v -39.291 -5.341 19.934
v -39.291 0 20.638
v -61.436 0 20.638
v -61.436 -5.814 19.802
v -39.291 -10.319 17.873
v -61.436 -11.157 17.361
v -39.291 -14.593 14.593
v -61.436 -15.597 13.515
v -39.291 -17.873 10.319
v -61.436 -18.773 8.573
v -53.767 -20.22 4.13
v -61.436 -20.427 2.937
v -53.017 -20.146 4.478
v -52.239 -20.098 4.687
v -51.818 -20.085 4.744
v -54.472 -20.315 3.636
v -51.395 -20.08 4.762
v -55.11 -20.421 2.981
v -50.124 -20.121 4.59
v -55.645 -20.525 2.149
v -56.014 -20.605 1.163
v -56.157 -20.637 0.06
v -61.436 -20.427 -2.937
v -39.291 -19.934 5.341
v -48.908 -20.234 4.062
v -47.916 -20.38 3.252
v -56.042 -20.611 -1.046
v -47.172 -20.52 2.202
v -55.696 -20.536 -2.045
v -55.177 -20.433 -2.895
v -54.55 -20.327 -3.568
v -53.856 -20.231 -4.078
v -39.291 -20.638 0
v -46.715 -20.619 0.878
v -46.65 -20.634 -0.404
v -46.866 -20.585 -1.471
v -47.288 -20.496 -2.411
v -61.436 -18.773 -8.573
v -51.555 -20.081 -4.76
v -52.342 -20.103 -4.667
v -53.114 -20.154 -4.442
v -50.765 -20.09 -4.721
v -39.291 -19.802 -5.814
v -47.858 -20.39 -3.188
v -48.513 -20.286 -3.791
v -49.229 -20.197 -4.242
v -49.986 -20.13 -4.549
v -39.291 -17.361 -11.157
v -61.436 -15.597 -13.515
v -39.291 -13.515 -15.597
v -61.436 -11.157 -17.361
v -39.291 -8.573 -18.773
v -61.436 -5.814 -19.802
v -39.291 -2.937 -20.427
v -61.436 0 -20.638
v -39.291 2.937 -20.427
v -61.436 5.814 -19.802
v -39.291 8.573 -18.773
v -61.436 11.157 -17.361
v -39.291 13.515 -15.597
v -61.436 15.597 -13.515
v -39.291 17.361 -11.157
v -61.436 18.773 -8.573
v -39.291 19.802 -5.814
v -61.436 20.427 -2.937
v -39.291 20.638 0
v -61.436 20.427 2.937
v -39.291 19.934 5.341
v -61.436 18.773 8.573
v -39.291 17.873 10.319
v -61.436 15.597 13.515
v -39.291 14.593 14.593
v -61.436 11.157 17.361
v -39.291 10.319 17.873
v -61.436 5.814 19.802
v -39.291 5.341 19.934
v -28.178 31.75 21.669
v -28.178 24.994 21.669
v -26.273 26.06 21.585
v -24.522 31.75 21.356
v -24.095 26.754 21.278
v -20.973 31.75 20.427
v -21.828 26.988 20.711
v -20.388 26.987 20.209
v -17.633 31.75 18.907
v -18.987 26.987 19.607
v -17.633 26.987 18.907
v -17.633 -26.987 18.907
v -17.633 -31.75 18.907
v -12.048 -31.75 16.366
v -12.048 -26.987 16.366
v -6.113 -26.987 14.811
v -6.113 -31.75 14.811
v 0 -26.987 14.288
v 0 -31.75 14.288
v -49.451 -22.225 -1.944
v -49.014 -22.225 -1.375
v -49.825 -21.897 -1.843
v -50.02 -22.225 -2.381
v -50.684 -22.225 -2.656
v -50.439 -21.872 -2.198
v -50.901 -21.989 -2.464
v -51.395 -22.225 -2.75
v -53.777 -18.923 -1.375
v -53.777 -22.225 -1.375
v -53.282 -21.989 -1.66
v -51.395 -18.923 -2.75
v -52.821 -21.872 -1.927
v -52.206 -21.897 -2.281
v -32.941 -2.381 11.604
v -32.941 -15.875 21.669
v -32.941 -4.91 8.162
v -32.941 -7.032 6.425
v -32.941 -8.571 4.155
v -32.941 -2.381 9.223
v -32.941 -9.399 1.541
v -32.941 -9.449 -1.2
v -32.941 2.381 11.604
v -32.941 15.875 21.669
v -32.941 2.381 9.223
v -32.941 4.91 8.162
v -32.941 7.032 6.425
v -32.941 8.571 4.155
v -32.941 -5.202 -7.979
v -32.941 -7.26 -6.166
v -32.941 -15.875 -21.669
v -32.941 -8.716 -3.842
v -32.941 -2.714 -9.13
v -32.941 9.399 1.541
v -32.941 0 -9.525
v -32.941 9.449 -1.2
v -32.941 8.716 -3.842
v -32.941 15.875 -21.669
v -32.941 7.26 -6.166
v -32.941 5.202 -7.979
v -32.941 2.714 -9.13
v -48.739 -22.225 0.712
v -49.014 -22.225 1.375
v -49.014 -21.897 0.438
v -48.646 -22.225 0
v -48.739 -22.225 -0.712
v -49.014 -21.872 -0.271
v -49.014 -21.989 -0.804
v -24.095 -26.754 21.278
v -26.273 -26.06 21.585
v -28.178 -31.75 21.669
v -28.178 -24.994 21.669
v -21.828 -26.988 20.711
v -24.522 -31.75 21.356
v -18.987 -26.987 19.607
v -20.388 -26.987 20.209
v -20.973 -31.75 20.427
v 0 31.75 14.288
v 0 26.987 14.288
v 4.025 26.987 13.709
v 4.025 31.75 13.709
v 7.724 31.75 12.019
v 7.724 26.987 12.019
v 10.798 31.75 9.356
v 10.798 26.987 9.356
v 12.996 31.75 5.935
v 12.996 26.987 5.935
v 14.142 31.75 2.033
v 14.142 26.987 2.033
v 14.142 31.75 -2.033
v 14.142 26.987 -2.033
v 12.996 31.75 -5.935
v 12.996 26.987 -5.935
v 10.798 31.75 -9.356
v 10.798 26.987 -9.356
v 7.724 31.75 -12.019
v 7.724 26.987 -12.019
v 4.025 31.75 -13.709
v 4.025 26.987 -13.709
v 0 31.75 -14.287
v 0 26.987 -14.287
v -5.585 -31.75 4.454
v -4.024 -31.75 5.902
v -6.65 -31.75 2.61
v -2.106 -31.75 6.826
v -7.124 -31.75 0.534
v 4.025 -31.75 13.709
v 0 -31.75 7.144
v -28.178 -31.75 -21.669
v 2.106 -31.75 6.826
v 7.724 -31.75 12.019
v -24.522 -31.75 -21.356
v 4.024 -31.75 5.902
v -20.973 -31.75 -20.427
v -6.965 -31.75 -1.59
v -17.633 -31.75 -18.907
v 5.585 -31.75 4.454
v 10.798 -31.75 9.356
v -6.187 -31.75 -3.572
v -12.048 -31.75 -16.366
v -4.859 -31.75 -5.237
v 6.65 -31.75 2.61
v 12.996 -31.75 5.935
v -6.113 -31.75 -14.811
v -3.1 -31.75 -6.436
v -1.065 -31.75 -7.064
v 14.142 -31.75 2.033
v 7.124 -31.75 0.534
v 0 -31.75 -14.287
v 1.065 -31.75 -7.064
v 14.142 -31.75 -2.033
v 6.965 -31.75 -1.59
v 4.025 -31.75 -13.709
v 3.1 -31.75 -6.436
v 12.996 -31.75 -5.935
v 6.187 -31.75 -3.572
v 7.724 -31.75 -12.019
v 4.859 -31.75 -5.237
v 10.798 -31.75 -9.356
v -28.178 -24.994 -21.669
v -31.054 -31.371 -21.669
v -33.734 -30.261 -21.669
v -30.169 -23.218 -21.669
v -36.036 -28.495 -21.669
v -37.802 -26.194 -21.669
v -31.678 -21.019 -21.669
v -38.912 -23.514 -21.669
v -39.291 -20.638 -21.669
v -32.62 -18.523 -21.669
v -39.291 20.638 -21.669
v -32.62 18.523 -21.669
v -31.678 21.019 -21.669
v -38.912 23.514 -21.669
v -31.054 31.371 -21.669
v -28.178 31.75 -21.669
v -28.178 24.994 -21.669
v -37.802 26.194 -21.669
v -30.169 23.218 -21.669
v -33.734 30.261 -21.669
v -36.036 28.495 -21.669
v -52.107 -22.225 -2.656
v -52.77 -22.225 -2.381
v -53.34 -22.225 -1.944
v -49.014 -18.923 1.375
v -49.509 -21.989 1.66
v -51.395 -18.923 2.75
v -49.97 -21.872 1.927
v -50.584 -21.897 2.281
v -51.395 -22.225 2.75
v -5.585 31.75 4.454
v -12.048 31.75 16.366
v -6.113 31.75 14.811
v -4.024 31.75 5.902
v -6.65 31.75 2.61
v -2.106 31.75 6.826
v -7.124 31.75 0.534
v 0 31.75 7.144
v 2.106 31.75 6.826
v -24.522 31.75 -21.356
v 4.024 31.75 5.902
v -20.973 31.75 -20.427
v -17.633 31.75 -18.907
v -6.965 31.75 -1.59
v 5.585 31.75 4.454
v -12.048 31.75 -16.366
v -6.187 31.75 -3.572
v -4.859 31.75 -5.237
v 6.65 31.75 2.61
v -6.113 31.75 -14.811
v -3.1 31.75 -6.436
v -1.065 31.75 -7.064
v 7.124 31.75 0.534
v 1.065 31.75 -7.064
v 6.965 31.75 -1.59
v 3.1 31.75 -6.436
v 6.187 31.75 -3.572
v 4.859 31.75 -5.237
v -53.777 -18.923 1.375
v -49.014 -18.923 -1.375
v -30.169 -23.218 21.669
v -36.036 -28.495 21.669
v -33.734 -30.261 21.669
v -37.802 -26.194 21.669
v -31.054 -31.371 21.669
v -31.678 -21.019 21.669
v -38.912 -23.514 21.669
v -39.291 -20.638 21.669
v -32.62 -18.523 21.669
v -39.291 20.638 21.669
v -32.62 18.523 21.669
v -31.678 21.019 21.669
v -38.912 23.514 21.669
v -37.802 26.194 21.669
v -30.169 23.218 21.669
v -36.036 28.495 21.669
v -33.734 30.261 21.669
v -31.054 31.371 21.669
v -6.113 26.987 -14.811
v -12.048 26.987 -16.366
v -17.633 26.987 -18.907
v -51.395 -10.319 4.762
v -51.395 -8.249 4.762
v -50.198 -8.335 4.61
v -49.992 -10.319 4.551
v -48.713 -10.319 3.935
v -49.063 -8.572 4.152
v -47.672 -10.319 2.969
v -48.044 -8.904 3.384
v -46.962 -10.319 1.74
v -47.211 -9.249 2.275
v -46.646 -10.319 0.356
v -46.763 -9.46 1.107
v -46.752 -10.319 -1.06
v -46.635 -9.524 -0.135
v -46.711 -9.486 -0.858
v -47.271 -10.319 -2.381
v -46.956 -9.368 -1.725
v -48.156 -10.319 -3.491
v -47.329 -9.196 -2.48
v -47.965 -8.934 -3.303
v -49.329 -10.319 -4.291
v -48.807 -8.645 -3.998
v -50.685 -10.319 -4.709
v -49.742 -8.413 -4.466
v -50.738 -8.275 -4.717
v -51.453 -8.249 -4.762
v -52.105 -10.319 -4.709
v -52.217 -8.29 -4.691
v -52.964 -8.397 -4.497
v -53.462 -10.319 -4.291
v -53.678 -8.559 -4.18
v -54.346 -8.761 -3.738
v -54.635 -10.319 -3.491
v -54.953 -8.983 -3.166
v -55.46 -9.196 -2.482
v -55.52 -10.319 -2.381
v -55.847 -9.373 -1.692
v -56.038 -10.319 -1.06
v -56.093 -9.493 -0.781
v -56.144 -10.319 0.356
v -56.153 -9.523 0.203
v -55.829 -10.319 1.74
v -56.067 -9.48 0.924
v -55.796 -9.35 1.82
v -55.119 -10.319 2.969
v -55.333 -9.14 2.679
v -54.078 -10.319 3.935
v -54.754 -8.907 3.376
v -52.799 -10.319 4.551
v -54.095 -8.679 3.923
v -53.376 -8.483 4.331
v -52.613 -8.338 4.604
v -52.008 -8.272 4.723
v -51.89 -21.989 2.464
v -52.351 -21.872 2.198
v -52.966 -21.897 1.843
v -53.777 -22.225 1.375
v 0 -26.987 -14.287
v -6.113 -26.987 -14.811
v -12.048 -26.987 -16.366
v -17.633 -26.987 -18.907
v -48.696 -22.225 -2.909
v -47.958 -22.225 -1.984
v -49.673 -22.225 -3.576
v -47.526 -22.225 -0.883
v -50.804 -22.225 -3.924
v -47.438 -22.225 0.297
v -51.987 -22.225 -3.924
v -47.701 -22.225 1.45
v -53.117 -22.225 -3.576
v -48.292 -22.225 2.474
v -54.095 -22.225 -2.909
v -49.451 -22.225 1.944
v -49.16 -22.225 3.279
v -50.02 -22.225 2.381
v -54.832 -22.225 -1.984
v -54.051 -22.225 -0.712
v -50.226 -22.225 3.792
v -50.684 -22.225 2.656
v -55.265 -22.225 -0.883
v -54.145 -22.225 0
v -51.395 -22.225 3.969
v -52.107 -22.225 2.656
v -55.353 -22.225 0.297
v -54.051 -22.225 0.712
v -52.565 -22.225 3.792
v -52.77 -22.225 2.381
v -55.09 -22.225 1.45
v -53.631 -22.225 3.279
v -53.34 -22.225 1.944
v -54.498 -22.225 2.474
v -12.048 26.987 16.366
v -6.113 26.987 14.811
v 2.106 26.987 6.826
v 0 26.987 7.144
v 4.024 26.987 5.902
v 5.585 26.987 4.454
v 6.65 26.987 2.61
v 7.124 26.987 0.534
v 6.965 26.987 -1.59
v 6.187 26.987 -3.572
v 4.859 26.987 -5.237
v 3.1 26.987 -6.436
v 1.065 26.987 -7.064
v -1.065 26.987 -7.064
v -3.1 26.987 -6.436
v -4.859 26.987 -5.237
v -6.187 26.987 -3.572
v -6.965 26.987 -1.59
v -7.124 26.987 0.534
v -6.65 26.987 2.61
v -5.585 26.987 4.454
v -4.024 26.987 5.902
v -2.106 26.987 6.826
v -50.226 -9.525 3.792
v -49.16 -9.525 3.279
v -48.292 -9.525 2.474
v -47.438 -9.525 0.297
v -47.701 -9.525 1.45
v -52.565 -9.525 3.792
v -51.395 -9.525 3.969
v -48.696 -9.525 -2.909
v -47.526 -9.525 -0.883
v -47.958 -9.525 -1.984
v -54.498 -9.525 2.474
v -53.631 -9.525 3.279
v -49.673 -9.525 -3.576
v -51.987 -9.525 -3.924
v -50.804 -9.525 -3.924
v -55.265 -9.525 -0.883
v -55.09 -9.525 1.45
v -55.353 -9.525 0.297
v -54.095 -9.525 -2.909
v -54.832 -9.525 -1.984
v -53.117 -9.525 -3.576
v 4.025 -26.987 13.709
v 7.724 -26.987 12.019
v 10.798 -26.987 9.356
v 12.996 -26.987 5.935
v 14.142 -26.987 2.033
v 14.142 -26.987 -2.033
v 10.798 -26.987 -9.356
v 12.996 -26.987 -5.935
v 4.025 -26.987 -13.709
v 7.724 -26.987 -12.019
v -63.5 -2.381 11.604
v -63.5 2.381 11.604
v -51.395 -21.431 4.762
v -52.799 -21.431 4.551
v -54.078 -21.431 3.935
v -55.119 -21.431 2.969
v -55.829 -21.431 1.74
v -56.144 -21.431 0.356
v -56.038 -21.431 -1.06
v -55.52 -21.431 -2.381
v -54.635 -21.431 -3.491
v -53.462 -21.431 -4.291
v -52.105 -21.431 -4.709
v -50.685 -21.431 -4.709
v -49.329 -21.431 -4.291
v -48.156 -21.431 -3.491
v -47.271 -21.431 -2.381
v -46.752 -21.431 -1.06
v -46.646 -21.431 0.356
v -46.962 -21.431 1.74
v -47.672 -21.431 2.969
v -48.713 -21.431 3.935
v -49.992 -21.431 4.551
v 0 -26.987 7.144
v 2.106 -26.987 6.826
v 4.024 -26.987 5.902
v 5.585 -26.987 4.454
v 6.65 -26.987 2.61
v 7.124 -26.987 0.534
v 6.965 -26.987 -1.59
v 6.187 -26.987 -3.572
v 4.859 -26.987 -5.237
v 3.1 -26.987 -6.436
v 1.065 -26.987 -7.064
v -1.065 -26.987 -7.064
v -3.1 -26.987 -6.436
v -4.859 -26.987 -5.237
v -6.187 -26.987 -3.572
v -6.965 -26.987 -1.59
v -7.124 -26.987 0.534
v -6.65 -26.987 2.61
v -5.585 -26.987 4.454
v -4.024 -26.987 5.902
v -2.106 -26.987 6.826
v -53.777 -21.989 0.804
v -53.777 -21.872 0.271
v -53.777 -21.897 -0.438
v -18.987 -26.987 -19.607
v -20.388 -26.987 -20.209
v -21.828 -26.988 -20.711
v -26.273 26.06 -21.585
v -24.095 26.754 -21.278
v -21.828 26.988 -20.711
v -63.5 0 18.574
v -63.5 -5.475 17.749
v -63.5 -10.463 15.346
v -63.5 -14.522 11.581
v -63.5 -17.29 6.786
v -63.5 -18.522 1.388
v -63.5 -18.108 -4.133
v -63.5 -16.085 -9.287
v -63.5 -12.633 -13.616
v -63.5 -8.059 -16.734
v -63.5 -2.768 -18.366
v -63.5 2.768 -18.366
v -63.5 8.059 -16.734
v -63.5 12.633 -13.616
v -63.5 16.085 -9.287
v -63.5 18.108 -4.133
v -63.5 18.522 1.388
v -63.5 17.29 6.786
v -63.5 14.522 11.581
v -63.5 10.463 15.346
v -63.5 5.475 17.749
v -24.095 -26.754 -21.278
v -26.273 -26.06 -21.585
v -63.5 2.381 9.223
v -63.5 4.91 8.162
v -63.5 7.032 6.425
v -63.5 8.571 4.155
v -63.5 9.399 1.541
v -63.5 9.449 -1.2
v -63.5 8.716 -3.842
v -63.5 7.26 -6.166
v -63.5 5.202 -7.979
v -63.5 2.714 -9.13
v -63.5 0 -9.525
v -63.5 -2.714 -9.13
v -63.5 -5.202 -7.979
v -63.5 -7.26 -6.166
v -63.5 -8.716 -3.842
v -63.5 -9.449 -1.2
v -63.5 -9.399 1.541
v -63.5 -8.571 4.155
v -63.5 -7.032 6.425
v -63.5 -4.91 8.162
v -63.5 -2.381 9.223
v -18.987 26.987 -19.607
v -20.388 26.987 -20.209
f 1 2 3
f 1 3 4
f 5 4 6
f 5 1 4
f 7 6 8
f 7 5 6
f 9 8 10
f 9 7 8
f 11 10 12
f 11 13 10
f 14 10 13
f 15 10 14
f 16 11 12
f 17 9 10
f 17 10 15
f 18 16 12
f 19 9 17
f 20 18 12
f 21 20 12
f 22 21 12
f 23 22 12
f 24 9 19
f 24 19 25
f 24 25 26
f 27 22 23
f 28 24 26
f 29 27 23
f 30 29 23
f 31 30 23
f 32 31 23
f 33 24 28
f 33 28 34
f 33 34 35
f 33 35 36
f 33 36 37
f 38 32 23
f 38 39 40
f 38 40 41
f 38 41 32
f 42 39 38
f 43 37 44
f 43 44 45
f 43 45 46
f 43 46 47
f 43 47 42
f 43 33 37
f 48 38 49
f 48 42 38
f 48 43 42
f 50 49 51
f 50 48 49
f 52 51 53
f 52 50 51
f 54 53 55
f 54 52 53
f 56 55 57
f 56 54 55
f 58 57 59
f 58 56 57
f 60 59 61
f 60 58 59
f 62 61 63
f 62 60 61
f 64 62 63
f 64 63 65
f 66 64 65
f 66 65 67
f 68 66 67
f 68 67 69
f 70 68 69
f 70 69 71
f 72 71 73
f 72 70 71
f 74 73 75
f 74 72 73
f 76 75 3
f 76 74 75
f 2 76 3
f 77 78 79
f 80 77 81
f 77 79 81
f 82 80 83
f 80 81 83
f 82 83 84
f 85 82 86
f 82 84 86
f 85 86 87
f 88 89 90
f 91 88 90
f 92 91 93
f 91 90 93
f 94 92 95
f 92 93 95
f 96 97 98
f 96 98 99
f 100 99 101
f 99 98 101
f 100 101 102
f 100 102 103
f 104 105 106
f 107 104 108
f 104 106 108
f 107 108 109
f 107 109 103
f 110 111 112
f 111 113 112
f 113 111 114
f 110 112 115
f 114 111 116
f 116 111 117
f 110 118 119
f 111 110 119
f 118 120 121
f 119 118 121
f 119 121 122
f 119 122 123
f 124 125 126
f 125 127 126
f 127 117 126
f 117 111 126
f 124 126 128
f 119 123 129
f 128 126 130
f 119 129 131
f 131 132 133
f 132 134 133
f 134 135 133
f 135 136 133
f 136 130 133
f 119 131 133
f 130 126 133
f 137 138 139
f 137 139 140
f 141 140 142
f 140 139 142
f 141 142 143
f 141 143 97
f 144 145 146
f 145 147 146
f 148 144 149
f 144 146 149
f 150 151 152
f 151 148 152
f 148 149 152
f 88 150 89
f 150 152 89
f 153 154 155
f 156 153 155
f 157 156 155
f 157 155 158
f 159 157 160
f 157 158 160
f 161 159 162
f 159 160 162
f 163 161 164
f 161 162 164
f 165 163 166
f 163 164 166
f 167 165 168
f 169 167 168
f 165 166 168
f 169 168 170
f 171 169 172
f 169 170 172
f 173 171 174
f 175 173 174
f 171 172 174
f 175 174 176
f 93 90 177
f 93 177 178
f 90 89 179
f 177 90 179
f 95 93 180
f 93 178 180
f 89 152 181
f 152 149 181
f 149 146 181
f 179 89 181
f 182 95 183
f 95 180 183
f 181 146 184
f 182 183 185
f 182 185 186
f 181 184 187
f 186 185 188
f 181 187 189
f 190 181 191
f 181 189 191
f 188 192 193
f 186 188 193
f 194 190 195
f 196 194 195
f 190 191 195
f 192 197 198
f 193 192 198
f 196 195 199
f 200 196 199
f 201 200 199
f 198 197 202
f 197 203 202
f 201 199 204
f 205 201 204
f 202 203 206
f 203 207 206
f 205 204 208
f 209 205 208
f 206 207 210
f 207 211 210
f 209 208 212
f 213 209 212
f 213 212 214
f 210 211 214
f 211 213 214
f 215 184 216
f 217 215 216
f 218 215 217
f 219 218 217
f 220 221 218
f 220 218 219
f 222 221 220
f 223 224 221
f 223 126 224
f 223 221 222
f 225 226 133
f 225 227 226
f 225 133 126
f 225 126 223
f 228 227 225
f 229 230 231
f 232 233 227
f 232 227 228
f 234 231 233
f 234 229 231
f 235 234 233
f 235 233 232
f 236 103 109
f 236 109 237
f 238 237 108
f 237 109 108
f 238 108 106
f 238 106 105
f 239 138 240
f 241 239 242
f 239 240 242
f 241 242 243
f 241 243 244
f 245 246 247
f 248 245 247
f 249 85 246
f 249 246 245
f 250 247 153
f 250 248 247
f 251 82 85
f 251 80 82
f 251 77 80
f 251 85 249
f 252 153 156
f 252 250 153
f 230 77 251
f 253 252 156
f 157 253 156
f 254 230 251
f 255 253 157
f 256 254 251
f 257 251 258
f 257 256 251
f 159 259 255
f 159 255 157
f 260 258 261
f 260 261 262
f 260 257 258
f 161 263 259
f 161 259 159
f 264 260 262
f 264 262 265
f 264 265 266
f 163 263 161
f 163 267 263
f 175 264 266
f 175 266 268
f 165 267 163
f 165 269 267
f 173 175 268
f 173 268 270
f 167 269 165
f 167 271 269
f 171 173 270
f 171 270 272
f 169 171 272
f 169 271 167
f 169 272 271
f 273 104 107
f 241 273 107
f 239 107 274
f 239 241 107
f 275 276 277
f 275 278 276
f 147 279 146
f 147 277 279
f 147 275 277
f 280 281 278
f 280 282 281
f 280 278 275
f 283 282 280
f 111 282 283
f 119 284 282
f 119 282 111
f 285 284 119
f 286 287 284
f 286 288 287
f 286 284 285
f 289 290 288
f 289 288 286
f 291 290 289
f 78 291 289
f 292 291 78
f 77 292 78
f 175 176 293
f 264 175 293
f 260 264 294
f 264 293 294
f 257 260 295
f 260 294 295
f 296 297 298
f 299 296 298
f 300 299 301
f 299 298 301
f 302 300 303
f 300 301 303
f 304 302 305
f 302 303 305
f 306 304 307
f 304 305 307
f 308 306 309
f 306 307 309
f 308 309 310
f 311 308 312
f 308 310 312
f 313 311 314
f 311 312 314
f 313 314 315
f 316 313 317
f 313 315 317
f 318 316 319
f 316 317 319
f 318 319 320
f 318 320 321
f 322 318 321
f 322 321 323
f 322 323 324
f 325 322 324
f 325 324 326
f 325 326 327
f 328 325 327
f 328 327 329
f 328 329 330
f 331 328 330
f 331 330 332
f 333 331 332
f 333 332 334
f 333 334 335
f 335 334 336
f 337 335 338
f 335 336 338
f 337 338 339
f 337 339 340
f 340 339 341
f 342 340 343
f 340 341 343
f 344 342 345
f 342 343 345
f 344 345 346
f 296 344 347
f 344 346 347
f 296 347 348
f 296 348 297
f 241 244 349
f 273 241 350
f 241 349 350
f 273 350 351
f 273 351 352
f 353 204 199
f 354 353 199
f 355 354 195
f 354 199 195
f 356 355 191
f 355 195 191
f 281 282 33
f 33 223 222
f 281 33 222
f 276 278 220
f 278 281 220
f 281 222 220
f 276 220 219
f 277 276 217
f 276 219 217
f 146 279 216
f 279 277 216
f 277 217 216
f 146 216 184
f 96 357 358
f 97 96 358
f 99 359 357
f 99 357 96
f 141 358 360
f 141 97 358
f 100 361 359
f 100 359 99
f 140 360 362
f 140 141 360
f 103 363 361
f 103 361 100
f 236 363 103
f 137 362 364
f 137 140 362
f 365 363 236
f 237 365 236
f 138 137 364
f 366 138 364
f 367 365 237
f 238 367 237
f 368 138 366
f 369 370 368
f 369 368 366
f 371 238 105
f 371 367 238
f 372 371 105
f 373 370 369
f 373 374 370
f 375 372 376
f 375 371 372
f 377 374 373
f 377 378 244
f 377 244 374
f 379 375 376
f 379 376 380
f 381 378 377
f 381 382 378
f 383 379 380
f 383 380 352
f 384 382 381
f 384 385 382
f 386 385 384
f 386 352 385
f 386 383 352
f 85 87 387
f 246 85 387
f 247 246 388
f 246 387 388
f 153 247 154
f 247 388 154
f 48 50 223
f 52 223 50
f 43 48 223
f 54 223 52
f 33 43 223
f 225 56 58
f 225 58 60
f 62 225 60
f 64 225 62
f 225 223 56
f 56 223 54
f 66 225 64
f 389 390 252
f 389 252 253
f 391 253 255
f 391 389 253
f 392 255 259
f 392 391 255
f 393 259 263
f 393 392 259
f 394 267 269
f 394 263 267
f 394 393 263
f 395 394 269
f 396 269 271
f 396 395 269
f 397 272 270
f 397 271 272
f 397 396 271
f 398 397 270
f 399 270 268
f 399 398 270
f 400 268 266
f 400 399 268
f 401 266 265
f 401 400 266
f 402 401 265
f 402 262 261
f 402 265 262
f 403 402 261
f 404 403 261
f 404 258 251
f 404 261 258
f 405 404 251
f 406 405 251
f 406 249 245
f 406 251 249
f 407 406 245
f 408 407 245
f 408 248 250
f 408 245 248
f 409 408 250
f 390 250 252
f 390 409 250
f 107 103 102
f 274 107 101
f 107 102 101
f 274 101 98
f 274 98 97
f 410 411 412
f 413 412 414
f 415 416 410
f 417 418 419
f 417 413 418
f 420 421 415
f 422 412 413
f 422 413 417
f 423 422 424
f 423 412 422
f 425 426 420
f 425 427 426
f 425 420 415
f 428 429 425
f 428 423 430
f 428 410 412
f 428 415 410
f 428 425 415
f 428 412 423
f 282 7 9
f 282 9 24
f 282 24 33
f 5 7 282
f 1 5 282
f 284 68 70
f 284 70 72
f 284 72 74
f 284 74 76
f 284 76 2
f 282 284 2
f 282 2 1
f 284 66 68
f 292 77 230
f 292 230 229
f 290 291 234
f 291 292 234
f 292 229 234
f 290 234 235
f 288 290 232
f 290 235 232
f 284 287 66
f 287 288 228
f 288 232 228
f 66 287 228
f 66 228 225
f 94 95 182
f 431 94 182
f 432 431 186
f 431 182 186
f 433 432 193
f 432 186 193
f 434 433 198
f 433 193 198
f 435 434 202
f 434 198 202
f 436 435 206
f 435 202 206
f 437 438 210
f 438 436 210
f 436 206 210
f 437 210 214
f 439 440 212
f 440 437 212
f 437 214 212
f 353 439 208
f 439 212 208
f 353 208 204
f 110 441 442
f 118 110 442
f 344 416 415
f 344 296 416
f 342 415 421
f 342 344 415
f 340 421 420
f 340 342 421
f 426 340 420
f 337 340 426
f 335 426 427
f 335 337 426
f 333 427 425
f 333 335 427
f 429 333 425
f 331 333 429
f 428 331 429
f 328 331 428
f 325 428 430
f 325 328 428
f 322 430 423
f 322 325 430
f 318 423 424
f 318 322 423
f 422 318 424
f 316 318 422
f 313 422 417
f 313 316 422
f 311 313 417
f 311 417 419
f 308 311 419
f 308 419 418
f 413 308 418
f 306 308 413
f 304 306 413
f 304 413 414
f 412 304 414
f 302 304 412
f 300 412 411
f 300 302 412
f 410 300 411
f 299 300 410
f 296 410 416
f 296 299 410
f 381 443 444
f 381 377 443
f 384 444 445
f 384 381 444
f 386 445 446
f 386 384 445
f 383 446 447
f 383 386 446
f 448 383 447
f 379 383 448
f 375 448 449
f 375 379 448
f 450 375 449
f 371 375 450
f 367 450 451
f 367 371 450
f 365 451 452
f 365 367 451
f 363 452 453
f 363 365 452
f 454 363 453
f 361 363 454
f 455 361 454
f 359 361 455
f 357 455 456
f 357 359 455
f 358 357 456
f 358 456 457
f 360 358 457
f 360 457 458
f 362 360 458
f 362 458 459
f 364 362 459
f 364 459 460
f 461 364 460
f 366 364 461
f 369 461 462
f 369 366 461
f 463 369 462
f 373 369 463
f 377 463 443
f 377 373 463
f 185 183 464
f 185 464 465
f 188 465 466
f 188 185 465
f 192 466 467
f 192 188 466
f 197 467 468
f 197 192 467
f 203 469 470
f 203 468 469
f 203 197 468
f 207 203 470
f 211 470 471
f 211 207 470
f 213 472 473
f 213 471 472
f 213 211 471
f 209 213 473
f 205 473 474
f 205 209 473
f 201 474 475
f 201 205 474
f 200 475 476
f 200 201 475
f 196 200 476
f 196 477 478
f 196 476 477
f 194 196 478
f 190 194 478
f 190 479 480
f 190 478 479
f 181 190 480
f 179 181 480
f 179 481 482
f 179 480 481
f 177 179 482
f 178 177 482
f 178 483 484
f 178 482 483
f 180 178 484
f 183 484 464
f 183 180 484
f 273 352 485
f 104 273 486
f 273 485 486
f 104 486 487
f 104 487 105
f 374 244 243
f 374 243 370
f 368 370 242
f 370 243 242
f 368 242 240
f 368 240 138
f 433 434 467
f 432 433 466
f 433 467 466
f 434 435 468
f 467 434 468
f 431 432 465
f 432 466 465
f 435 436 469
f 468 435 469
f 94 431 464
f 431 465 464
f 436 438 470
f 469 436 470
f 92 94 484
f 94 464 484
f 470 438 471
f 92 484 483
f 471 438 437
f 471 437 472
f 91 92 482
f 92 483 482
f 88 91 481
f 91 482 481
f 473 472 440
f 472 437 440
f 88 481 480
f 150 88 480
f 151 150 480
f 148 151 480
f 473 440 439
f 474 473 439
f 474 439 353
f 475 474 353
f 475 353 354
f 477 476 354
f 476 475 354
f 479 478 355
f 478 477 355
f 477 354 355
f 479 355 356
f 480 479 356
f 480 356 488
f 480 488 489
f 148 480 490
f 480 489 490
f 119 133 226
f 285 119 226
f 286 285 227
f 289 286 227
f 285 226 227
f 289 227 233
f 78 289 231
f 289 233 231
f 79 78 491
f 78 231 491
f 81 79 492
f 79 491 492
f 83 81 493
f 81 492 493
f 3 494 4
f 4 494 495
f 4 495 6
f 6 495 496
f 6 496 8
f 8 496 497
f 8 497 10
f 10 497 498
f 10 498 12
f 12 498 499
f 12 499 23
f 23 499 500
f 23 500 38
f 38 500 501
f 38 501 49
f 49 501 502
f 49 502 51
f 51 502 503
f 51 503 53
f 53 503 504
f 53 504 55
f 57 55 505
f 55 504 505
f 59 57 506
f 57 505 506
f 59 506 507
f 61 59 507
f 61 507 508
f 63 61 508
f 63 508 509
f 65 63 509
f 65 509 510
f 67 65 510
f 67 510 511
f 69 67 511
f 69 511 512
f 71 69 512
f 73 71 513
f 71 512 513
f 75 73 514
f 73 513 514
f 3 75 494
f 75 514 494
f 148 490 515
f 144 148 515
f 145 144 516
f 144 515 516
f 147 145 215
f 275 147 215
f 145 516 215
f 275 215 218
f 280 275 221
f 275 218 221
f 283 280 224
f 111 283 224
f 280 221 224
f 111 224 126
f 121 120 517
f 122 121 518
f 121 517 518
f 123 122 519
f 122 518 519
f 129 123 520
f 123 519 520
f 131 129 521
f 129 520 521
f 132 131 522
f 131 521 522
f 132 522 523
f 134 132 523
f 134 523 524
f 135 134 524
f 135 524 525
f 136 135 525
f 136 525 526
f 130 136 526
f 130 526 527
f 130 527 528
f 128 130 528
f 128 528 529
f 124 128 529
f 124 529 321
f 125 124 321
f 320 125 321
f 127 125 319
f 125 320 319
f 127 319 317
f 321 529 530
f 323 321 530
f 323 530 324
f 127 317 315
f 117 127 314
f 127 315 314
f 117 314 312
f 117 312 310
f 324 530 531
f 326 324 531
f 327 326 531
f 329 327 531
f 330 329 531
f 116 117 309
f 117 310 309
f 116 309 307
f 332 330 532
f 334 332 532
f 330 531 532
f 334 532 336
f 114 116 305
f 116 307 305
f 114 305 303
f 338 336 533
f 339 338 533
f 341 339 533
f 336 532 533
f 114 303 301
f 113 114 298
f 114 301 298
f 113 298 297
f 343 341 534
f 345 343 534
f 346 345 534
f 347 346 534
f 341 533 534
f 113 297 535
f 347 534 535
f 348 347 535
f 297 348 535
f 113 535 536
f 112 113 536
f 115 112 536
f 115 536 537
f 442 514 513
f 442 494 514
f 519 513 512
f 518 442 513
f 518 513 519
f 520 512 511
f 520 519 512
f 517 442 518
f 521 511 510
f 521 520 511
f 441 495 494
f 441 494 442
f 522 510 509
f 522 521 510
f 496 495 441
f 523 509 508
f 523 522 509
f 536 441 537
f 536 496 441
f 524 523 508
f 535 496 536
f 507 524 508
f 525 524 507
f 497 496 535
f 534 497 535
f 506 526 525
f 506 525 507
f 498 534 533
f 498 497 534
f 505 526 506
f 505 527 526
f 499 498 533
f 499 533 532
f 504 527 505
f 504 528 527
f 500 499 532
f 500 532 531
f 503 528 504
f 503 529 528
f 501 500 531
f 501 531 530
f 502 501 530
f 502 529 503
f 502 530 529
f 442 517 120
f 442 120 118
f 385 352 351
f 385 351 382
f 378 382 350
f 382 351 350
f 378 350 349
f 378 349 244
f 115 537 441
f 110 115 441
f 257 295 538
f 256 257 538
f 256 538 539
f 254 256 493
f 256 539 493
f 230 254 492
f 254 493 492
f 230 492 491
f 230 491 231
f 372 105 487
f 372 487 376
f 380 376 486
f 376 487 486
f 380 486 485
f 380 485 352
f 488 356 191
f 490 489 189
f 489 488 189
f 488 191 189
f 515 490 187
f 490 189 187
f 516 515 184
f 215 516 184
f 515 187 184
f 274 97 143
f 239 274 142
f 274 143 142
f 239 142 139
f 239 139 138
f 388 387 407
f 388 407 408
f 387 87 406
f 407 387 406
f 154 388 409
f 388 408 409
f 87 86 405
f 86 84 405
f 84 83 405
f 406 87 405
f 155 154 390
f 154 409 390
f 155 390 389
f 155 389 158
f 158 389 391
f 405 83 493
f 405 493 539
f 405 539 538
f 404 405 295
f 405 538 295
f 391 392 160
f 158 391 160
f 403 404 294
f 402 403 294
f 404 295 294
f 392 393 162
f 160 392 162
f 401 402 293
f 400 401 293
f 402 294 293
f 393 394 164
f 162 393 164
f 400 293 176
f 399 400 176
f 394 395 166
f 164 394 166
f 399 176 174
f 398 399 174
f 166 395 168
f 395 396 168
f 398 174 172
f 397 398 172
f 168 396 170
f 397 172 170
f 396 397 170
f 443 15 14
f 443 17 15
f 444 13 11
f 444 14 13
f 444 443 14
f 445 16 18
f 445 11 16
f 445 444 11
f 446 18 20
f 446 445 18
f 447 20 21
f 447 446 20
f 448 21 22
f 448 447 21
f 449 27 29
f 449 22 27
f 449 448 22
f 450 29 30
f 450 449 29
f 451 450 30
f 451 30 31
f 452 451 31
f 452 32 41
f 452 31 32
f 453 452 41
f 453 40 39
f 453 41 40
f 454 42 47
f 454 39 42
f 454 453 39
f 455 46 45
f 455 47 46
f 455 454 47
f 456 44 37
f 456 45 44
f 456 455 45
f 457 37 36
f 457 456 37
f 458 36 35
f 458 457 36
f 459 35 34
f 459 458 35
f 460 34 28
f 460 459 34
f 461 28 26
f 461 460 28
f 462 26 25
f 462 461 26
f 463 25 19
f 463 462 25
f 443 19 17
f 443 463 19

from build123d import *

# Parameters (mm, degrees)
SKETCH1_W           = 30.559375
SKETCH1_H           = 20.6375
BOSS_EXTRUDE6_DEPTH = 31.75
CHAMFER1_SIZE       = 2.06375
EXTRUDE3_DEPTH      = 75.228527622
EXTRUDE3_DEPTH_BACK = 75.228527622
EXTRUDE1_DEPTH      = 75.228527622
EXTRUDE1_DEPTH_BACK = 75.228527622
SKETCH4_R           = 9.525
EXTRUDE4_DEPTH      = 30.559375
EXTRUDE6_DEPTH      = 75.228527694
EXTRUDE6_DEPTH_BACK = 75.228527694
SKETCH6_R           = 7.14375
SKETCH33_W          = 2.38125
SKETCH33_H          = 4.7625
CUT_EXTRUDE1_DEPTH  = 87.767041438
SKETCH34_R          = 4.7625
CUT_EXTRUDE2_DEPTH  = 75.228527694
CUT_EXTRUDE3_DEPTH  = 3.302


with BuildPart() as part:
    # Sketch1 → Revolve1 (revolve)
    with BuildSketch(Plane(origin=(0, 0, 0), x_dir=(1, 0, 0), z_dir=(0, 1, 0)), mode=Mode.PRIVATE) as revolve1_sk:
        with Locations((-48.2203125, 10.31875)):
            Rectangle(SKETCH1_W, SKETCH1_H)
    revolve(revolve1_sk.sketch.rotate(Axis((-63.5, 0, 0), (1, 0, 0)), 180), axis=Axis((-63.5, 0, 0), (1, 0, 0)))

    # Sketch30 → Boss-Extrude6 (add, symmetric)
    with BuildSketch(Plane(origin=(0, 0, 0), x_dir=(1, 0, 0), z_dir=(0, 1, 0))):
        Polygon((-39.290625, 21.669375), (-39.290625, -21.669375), (-21.828125, -21.669375), (14.2875, -21.669375), (14.2875, 21.669375), (-21.828125, 21.669375), align=None)
    extrude(amount=BOSS_EXTRUDE6_DEPTH, both=True)

    # Chamfer1
    chamfer1_edges = [part.edges().sort_by_distance(p)[0] for p in [
        (-63.5, 0, -20.6375),
    ]]
    chamfer(chamfer1_edges, length=CHAMFER1_SIZE)

    # Sketch3 → Extrude3 (cut, two sides: drawn at the far end of the back side and taken through both)
    with BuildSketch(Plane.XY.offset(-EXTRUDE3_DEPTH_BACK)):
        with BuildLine():
            Line((-21.828125, 26.9875), (32.940625, 26.9875))
            Line((32.940625, 26.9875), (32.940625, -26.9875))
            Line((32.940625, -26.9875), (-21.828125, -26.9875))
            ThreePointArc((-21.828125, -26.9875), (-29.685849106, -23.732724106), (-32.940625, -15.875))
            Line((-32.940625, -15.875), (-32.940625, 15.875))
            ThreePointArc((-32.940625, 15.875), (-29.685849106, 23.732724106), (-21.828125, 26.9875))
        make_face()
        with BuildLine():
            Line((-39.290625, 31.75), (-28.178125, 31.75))
            ThreePointArc((-28.178125, 31.75), (-36.035849106, 28.495224106), (-39.290625, 20.6375))
            Line((-39.290625, 20.6375), (-39.290625, 31.75))
        make_face()
        with BuildLine():
            Line((-39.290625, -31.75), (-39.290625, -20.6375))
            ThreePointArc((-39.290625, -20.6375), (-36.035849106, -28.495224106), (-28.178125, -31.75))
            Line((-28.178125, -31.75), (-39.290625, -31.75))
        make_face()
    extrude(amount=EXTRUDE3_DEPTH + EXTRUDE3_DEPTH_BACK, mode=Mode.SUBTRACT)

    # Sketch2 → Extrude1 (cut, two sides: drawn at the far end of the back side and taken through both)
    with BuildSketch(Plane(origin=(0, 0, 0), x_dir=(1, 0, 0), z_dir=(0, 1, 0)).offset(-EXTRUDE1_DEPTH_BACK)):
        with BuildLine():
            Line((20.6375, 31.75), (20.6375, -31.75))
            Line((20.6375, -31.75), (-21.828125, -31.75))
            Line((-21.828125, -31.75), (-28.178125, -21.669375))
            ThreePointArc((-28.178125, -21.669375), (-22.727549003, -20.967272623), (-17.632826724, -18.906803902))
            ThreePointArc((-17.632826724, -18.906803902), (-9.113925428, -15.461487614), (0, -14.2875))
            ThreePointArc((0, -14.2875), (14.2875, 0), (0, 14.2875))
            ThreePointArc((0, 14.2875), (-9.113925428, 15.461487614), (-17.632826724, 18.906803902))
            ThreePointArc((-17.632826724, 18.906803902), (-22.727549003, 20.967272623), (-28.178125, 21.669375))
            Line((-28.178125, 21.669375), (-21.828125, 31.75))
            Line((-21.828125, 31.75), (20.6375, 31.75))
        make_face()
    extrude(amount=EXTRUDE1_DEPTH + EXTRUDE1_DEPTH_BACK, mode=Mode.SUBTRACT)

    # Sketch4 → Extrude4 (cut)
    with BuildSketch(Plane.ZY.offset(63.5)):
        Circle(SKETCH4_R)
    extrude(amount=-EXTRUDE4_DEPTH, mode=Mode.SUBTRACT)

    # Sketch6 → Extrude6 (cut, two sides: drawn at the far end of the back side and taken through both)
    with BuildSketch(Plane(origin=(0, 0, 0), x_dir=(1, 0, 0), z_dir=(0, 1, 0)).offset(-EXTRUDE6_DEPTH_BACK)):
        with Locations(Location((0, 0, 0), (0, 0, 270))):
            Circle(SKETCH6_R)
    extrude(amount=EXTRUDE6_DEPTH + EXTRUDE6_DEPTH_BACK, mode=Mode.SUBTRACT)

    # Sketch33 → Cut-Extrude1 (cut, through all)
    with BuildSketch(Plane.ZY.offset(63.5)):
        with Locations((10.413166593, 0)):
            Rectangle(SKETCH33_W, SKETCH33_H)
    extrude(amount=-CUT_EXTRUDE1_DEPTH, mode=Mode.SUBTRACT)

    # Sketch34 → Cut-Extrude2 (cut, through all)
    with BuildSketch(Plane(origin=(0, 0, 0), x_dir=(1, 0, 0), z_dir=(0, 1, 0))):
        with Locations(Location((-51.3953125, 0, 0), (0, 0, 270))):
            Circle(SKETCH34_R)
    extrude(amount=-CUT_EXTRUDE2_DEPTH, mode=Mode.SUBTRACT)

    # Sketch35 → Revolve2 (revolve)
    with BuildSketch(Plane(origin=(-51.3953125, 0, 0), x_dir=(0, 0, -1), z_dir=(1, 0, 0))):
        Polygon((-3.96875, -9.525), (-4.7625, -10.31875), (-4.7625, -21.43125), (-3.96875, -22.225), (0, -22.225), (0, -9.525), align=None)
    revolve(axis=Axis((-51.3953125, -9.525, 0), (0, -1, 0)))

    # Sketch36 → Cut-Extrude3 (cut)
    with BuildSketch(Plane.XZ.offset(22.225)):
        Polygon((-51.3953125, -2.749630657), (-49.0140625, -1.374815329), (-49.0140625, 1.374815329), (-51.3953125, 2.749630657), (-53.7765625, 1.374815329), (-53.7765625, -1.374815329), align=None)
    extrude(amount=-CUT_EXTRUDE3_DEPTH, mode=Mode.SUBTRACT)

    # Cut-Extrude4 cone 1 section (through the dimple's axis) → Cut-Extrude4 (revolve, cut)
    with BuildSketch(Plane(origin=(-51.3953125, -22.225, 0), x_dir=(0, 0, -1), z_dir=(1, 0, 0))):
        Polygon((0, 0), (2.749630657, 0), (0, 2.749630657), align=None)
    revolve(axis=Axis((-51.3953125, -22.225, 0), (0, 1, 0)), mode=Mode.SUBTRACT)


solid = part.part
